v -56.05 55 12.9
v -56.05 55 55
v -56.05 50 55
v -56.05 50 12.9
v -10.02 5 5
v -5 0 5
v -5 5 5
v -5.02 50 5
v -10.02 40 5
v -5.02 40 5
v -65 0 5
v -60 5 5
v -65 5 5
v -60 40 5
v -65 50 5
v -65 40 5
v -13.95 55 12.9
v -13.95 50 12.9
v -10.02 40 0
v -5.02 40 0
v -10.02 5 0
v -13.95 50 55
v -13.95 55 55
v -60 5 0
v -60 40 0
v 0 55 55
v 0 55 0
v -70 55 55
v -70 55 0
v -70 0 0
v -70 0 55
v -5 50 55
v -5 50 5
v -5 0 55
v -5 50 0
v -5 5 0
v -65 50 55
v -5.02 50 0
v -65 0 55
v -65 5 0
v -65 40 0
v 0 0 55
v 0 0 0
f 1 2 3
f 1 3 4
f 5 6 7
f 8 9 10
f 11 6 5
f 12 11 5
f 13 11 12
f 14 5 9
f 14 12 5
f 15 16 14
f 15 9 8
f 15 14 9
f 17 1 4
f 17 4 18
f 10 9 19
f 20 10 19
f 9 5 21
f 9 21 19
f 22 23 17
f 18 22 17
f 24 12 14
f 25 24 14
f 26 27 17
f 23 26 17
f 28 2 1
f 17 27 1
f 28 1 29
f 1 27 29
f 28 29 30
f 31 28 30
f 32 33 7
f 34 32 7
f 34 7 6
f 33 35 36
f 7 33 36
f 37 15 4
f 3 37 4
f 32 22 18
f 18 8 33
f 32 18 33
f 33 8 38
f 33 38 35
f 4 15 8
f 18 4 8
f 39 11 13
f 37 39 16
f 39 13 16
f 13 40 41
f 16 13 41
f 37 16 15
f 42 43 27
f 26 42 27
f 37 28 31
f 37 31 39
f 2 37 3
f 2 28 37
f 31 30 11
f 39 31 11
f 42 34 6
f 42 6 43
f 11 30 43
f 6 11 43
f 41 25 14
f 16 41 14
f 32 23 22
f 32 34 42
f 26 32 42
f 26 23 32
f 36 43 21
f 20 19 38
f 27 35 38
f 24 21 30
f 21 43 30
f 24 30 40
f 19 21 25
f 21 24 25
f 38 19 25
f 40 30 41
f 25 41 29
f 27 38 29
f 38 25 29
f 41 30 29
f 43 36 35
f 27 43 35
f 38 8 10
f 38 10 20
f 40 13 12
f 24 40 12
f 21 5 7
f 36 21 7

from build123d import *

# Parameters (mm, degrees)
SKETCH1_W           = 70
SKETCH1_H           = 55
BOSS_EXTRUDE1_DEPTH = 5
SKETCH2_W           = 5
SKETCH2_H           = 45
SKETCH2_W_2         = 5.019591865
CUT_EXTRUDE1_DEPTH  = 5
BOSS_EXTRUDE4_DEPTH = 50
SKETCH7_W           = 42.1
SKETCH7_H           = 42.1
CUT_EXTRUDE2_DEPTH  = 5
SKETCH9_W           = 5
SKETCH9_H           = 10
BOSS_EXTRUDE5_DEPTH = 5
SKETCH11_W          = 5
SKETCH11_H          = 10
BOSS_EXTRUDE6_DEPTH = 5


with BuildPart() as part:
    # Sketch1 → Boss-Extrude1 (new body)
    with BuildSketch(Plane.XY):
        with Locations((-35, 27.5)):
            Rectangle(SKETCH1_W, SKETCH1_H)
    extrude(amount=BOSS_EXTRUDE1_DEPTH)

    # Sketch2 → Cut-Extrude1 (cut)
    with BuildSketch(Plane.XY.offset(5)):
        with Locations((-62.5, 27.5)):
            Rectangle(SKETCH2_W, SKETCH2_H)
        with Locations((-7.509795933, 27.5)):
            Rectangle(SKETCH2_W_2, SKETCH2_H)
    extrude(amount=-CUT_EXTRUDE1_DEPTH, mode=Mode.SUBTRACT)

    # Sketch6 → Boss-Extrude4 (add)
    with BuildSketch(Plane.XY.offset(5)):
        Polygon((-70, 0), (-65, 0), (-65, 50), (-5, 50), (-5, 0), (0, 0), (0, 55), (-5, 55), (-65, 55), (-70, 55), align=None)
    extrude(amount=BOSS_EXTRUDE4_DEPTH)

    # Sketch7 → Cut-Extrude2 (cut)
    with BuildSketch(Plane(origin=(0, 55, 0), x_dir=(1, 0, 0), z_dir=(0, 1, 0))):
        with Locations((-35, -33.95)):
            Rectangle(SKETCH7_W, SKETCH7_H)
    extrude(amount=-CUT_EXTRUDE2_DEPTH, mode=Mode.SUBTRACT)

    # Sketch9 → Boss-Extrude5 (add)
    with BuildSketch(Plane.ZY.offset(60)):
        with Locations((2.5, 45)):
            Rectangle(SKETCH9_W, SKETCH9_H)
    extrude(amount=BOSS_EXTRUDE5_DEPTH)

    # Sketch11 → Boss-Extrude6 (add)
    with BuildSketch(Plane(origin=(-10.019591865, 0, 0), x_dir=(0, 0, -1), z_dir=(1, 0, 0))):
        with Locations((-2.5, 45)):
            Rectangle(SKETCH11_W, SKETCH11_H)
    extrude(amount=BOSS_EXTRUDE6_DEPTH)


solid = part.part
